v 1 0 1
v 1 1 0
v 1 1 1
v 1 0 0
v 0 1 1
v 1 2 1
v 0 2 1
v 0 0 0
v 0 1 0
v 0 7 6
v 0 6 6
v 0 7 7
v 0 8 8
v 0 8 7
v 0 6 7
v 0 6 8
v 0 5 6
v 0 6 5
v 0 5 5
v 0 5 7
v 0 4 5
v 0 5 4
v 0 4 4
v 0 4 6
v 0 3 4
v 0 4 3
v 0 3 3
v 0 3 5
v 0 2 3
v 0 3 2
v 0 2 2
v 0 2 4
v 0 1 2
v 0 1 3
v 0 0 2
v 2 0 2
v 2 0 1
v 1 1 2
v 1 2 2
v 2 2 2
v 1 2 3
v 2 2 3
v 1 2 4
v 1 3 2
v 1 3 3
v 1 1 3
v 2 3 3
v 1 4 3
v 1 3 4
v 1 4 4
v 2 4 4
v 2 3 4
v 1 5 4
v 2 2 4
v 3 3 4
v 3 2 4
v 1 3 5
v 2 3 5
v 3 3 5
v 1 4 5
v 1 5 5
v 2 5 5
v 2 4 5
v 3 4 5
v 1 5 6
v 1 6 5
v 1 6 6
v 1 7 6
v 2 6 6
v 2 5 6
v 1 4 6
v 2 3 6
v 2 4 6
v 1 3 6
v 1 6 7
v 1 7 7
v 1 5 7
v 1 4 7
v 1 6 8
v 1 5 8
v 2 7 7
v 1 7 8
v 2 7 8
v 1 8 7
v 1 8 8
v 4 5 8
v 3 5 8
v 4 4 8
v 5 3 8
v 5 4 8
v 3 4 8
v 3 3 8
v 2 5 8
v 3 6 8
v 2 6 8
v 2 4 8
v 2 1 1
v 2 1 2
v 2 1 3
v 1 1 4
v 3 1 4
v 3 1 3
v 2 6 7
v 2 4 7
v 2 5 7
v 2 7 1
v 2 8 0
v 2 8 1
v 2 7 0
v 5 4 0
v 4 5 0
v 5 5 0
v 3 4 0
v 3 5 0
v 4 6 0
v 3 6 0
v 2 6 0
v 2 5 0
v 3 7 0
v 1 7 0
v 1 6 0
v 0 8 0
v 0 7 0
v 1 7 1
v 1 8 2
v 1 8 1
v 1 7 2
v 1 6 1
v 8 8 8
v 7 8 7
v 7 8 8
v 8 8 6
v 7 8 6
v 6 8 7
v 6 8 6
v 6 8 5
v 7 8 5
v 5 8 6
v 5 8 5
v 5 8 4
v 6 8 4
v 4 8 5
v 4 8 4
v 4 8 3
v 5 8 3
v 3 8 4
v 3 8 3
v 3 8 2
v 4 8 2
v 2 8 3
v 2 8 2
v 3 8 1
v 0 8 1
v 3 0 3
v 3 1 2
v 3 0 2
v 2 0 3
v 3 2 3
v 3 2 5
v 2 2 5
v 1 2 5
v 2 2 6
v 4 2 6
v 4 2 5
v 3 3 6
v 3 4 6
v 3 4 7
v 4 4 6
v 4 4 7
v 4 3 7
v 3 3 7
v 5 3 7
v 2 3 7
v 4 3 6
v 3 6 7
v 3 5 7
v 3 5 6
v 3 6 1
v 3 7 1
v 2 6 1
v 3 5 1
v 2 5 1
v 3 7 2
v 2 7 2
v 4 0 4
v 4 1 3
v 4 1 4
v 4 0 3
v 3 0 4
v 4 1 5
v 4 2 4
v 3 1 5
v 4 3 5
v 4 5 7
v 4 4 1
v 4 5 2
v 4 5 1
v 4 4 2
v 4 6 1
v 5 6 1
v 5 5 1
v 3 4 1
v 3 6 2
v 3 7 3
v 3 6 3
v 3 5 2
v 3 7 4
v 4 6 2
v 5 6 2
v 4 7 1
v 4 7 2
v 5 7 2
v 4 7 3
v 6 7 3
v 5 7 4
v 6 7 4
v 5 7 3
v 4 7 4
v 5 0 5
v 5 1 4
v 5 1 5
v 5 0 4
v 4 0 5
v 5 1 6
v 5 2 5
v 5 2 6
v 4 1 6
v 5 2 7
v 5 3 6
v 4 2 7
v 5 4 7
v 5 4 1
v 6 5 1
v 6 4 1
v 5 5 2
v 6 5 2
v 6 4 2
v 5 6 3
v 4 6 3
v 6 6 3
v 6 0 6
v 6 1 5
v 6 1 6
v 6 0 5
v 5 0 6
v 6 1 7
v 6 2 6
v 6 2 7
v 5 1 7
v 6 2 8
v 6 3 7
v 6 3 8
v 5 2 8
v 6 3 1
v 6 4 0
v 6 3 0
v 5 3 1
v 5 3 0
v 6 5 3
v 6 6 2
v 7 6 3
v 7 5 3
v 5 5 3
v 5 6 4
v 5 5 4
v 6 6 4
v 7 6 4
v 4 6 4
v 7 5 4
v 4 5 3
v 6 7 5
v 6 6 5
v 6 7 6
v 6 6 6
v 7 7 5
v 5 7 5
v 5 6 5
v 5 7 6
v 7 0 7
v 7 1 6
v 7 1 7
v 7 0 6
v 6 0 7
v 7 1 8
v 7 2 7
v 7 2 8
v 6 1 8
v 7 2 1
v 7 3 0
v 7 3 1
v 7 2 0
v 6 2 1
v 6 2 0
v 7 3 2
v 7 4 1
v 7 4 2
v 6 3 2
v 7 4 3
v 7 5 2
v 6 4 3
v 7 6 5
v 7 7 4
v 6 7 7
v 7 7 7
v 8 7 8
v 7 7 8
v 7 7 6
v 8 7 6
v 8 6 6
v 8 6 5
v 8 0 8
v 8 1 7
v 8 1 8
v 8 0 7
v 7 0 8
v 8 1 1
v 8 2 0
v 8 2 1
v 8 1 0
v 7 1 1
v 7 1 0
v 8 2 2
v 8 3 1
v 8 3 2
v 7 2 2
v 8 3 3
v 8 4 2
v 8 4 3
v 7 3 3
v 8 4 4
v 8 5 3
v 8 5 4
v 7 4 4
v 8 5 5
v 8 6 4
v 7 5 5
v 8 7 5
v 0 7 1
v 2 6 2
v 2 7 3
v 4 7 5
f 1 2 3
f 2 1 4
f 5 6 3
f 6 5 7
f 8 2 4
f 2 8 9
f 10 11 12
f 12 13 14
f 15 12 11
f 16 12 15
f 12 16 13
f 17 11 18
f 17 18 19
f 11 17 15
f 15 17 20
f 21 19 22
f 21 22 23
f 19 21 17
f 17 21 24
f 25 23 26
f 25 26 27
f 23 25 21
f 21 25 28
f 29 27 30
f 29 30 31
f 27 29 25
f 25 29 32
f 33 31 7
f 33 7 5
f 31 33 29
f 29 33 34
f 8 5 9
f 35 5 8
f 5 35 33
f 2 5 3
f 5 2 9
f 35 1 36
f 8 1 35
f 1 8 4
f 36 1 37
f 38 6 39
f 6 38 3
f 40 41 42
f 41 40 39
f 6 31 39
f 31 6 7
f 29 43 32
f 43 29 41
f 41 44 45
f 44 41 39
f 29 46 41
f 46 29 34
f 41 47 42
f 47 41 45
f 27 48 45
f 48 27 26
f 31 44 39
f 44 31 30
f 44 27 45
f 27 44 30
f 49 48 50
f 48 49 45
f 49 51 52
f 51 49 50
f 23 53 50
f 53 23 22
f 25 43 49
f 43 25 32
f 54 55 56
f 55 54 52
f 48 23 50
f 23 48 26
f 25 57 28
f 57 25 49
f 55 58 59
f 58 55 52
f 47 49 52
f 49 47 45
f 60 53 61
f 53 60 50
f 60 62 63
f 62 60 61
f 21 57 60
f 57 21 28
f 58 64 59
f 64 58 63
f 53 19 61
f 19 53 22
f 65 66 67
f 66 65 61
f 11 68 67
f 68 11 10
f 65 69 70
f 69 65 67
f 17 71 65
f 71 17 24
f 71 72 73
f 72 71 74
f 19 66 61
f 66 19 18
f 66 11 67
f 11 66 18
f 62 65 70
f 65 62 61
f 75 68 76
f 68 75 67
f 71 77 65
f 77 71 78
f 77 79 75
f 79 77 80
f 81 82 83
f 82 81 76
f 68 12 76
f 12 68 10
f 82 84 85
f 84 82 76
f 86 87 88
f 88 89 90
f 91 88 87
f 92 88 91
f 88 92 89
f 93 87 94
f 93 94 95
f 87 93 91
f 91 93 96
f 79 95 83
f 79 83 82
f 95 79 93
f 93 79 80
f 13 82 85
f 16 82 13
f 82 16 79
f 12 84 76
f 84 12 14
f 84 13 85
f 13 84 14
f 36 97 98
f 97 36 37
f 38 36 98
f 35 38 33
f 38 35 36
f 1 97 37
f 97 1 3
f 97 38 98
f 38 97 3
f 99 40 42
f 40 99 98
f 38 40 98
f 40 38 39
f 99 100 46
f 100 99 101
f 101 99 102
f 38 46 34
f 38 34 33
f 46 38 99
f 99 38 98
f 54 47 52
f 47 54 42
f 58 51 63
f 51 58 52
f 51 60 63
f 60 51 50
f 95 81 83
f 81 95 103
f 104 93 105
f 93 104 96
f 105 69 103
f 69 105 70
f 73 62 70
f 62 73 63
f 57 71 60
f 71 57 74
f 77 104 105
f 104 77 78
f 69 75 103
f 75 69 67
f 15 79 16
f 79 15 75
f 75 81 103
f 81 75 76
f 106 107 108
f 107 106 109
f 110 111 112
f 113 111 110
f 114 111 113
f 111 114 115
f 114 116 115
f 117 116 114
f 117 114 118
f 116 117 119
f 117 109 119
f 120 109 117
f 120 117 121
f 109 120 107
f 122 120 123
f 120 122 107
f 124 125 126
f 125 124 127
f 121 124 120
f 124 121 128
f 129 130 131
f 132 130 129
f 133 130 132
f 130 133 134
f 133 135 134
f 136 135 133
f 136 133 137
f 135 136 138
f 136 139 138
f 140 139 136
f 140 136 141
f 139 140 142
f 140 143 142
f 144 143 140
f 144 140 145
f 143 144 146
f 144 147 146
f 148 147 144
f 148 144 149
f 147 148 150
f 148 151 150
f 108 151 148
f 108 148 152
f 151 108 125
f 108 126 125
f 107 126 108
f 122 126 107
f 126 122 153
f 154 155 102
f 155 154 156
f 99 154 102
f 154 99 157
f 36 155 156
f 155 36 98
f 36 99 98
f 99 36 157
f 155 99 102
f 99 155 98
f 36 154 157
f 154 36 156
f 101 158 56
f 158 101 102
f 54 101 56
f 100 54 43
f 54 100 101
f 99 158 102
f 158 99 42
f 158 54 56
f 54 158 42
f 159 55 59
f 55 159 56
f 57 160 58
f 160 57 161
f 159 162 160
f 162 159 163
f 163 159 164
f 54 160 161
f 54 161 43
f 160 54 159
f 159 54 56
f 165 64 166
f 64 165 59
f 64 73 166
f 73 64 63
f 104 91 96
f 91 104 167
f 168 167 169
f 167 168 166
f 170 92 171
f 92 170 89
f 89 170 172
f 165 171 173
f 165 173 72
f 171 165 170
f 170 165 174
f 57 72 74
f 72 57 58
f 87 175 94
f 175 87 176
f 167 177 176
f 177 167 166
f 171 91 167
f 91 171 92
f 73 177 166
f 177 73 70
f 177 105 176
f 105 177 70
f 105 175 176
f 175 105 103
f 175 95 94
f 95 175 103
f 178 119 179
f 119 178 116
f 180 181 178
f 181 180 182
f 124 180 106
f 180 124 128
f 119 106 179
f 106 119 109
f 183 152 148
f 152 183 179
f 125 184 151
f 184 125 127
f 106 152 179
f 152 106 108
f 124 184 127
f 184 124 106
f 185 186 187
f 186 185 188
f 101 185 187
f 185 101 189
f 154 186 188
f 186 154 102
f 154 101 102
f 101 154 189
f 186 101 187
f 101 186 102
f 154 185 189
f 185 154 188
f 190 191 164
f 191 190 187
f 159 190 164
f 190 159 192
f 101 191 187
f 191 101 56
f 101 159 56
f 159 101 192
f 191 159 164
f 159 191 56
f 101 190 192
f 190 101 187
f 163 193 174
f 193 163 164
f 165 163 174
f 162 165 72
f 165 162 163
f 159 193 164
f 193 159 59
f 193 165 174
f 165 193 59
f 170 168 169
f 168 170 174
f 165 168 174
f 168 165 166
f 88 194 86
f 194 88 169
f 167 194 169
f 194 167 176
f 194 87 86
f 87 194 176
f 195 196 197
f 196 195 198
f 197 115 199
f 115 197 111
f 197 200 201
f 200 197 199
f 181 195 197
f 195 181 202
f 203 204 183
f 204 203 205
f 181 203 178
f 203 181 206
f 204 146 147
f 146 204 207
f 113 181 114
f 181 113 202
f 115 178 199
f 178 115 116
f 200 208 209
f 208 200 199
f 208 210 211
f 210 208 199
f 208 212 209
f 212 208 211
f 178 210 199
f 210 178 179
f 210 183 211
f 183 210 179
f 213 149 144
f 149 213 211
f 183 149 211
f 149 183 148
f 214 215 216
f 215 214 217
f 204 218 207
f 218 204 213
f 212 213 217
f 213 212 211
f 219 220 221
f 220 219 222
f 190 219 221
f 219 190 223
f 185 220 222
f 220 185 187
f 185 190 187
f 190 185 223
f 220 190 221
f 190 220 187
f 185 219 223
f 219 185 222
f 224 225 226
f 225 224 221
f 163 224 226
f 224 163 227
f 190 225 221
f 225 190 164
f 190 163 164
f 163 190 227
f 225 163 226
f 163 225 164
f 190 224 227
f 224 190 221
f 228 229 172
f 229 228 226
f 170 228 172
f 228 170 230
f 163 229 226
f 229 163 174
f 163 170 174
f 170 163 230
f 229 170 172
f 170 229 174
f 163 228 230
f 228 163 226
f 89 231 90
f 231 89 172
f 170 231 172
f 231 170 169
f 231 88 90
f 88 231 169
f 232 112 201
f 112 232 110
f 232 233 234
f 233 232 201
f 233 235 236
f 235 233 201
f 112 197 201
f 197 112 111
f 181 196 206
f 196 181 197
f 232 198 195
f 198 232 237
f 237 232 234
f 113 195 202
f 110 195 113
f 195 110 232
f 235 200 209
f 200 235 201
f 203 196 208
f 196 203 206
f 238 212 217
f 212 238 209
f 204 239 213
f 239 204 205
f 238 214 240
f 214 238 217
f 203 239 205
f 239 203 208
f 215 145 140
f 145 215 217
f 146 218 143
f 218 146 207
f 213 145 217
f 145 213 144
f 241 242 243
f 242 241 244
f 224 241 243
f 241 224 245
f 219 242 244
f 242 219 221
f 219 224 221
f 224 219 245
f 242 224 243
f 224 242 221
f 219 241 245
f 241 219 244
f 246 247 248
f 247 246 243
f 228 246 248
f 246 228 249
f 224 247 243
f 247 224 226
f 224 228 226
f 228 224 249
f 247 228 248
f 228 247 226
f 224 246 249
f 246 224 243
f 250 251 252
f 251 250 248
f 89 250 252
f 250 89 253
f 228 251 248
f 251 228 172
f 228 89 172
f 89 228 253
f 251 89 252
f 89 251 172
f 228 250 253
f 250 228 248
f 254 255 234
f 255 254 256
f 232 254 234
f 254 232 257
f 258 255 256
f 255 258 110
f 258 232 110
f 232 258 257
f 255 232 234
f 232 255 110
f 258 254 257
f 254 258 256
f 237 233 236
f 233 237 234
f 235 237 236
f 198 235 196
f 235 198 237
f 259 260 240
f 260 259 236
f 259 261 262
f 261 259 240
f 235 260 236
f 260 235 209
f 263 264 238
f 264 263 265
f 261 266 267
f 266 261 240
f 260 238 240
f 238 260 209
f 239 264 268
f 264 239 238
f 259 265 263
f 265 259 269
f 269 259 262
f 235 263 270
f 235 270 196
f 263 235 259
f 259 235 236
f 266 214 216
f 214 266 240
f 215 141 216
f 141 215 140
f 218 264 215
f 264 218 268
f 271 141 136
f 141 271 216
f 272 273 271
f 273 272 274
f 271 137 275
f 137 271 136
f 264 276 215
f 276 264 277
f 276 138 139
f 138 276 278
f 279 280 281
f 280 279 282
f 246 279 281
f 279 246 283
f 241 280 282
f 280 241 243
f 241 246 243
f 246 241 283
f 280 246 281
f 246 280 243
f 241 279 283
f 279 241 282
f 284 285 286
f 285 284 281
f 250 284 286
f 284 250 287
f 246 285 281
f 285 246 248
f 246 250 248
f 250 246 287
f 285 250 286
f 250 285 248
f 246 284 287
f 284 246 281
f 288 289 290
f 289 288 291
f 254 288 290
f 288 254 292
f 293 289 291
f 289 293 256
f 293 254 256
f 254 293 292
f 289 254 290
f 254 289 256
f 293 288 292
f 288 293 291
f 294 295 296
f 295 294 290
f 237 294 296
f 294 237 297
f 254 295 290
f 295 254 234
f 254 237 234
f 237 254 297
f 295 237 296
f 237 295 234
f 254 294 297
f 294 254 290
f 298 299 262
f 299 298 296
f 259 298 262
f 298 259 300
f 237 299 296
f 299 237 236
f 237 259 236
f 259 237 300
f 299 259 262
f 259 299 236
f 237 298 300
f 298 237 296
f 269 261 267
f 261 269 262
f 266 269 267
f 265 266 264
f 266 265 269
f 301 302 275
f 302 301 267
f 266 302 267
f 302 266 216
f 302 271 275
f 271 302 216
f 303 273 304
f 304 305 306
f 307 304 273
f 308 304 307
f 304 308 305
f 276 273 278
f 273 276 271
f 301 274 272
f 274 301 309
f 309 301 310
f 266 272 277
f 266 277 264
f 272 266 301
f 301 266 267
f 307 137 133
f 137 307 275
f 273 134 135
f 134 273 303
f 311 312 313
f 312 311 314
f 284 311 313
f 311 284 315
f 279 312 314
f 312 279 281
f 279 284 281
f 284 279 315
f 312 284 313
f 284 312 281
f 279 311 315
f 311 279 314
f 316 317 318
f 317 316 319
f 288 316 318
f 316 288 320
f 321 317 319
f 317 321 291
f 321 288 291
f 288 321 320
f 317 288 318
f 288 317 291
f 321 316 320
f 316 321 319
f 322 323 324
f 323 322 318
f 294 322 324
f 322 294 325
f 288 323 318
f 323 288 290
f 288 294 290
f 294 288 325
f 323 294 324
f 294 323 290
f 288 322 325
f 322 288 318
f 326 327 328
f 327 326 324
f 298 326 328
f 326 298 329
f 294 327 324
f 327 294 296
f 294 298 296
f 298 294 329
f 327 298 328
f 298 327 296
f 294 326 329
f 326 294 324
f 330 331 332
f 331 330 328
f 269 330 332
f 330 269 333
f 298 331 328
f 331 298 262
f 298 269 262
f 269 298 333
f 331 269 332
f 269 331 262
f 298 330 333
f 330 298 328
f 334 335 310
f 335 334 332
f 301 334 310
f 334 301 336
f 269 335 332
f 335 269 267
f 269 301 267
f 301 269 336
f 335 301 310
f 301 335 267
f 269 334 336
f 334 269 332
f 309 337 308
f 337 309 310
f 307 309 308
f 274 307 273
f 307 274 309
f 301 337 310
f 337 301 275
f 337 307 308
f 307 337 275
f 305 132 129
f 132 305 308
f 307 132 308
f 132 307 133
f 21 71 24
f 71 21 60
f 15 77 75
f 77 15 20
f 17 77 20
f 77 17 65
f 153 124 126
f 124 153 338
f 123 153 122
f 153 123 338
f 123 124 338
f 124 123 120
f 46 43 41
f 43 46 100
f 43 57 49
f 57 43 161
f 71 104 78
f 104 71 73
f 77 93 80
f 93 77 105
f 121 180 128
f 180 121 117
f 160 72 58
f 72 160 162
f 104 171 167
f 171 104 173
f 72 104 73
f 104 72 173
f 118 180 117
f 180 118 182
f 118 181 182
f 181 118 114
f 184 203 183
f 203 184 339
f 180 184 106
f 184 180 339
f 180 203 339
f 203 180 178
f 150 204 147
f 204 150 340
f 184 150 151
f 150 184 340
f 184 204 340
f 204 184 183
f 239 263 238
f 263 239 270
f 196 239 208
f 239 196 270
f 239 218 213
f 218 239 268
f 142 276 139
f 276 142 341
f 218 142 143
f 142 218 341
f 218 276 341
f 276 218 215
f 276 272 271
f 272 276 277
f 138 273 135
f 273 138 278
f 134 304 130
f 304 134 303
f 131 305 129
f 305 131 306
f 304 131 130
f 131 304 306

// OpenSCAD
union() {
    translate([0, 0, 0]) cube([1, 1, 1]);
    translate([0, 1, 1]) cube([1, 1, 1]);
    translate([0, 2, 2]) cube([1, 1, 1]);
    translate([0, 3, 3]) cube([1, 1, 1]);
    translate([0, 4, 4]) cube([1, 1, 1]);
    translate([0, 5, 5]) cube([1, 1, 1]);
    translate([0, 6, 6]) cube([1, 1, 1]);
    translate([0, 7, 7]) cube([1, 1, 1]);
    translate([1, 0, 1]) cube([1, 1, 1]);
    translate([1, 1, 2]) cube([1, 1, 1]);
    translate([1, 2, 3]) cube([1, 1, 1]);
    translate([1, 3, 4]) cube([1, 1, 1]);
    translate([1, 4, 5]) cube([1, 1, 1]);
    translate([1, 5, 6]) cube([1, 1, 1]);
    translate([1, 6, 7]) cube([1, 1, 1]);
    translate([1, 7, 0]) cube([1, 1, 1]);
    translate([2, 0, 2]) cube([1, 1, 1]);
    translate([2, 1, 3]) cube([1, 1, 1]);
    translate([2, 2, 4]) cube([1, 1, 1]);
    translate([2, 3, 5]) cube([1, 1, 1]);
    translate([2, 4, 6]) cube([1, 1, 1]);
    translate([2, 5, 7]) cube([1, 1, 1]);
    translate([2, 6, 0]) cube([1, 1, 1]);
    translate([2, 7, 1]) cube([1, 1, 1]);
    translate([3, 0, 3]) cube([1, 1, 1]);
    translate([3, 1, 4]) cube([1, 1, 1]);
    translate([3, 2, 5]) cube([1, 1, 1]);
    translate([3, 3, 6]) cube([1, 1, 1]);
    translate([3, 4, 7]) cube([1, 1, 1]);
    translate([3, 5, 0]) cube([1, 1, 1]);
    translate([3, 6, 1]) cube([1, 1, 1]);
    translate([3, 7, 2]) cube([1, 1, 1]);
    translate([4, 0, 4]) cube([1, 1, 1]);
    translate([4, 1, 5]) cube([1, 1, 1]);
    translate([4, 2, 6]) cube([1, 1, 1]);
    translate([4, 3, 7]) cube([1, 1, 1]);
    translate([4, 4, 0]) cube([1, 1, 1]);
    translate([4, 5, 1]) cube([1, 1, 1]);
    translate([4, 6, 2]) cube([1, 1, 1]);
    translate([4, 7, 3]) cube([1, 1, 1]);
    translate([5, 0, 5]) cube([1, 1, 1]);
    translate([5, 1, 6]) cube([1, 1, 1]);
    translate([5, 2, 7]) cube([1, 1, 1]);
    translate([5, 3, 0]) cube([1, 1, 1]);
    translate([5, 4, 1]) cube([1, 1, 1]);
    translate([5, 5, 2]) cube([1, 1, 1]);
    translate([5, 6, 3]) cube([1, 1, 1]);
    translate([5, 7, 4]) cube([1, 1, 1]);
    translate([6, 0, 6]) cube([1, 1, 1]);
    translate([6, 1, 7]) cube([1, 1, 1]);
    translate([6, 2, 0]) cube([1, 1, 1]);
    translate([6, 3, 1]) cube([1, 1, 1]);
    translate([6, 4, 2]) cube([1, 1, 1]);
    translate([6, 5, 3]) cube([1, 1, 1]);
    translate([6, 6, 4]) cube([1, 1, 1]);
    translate([6, 7, 5]) cube([1, 1, 1]);
    translate([7, 0, 7]) cube([1, 1, 1]);
    translate([7, 1, 0]) cube([1, 1, 1]);
    translate([7, 2, 1]) cube([1, 1, 1]);
    translate([7, 3, 2]) cube([1, 1, 1]);
    translate([7, 4, 3]) cube([1, 1, 1]);
    translate([7, 5, 4]) cube([1, 1, 1]);
    translate([7, 6, 5]) cube([1, 1, 1]);
    translate([7, 7, 6]) cube([1, 1, 1]);
    translate([0, 0, 1]) cube([1, 1, 1]);
    translate([0, 1, 2]) cube([1, 1, 1]);
    translate([0, 2, 3]) cube([1, 1, 1]);
    translate([0, 3, 4]) cube([1, 1, 1]);
    translate([0, 4, 5]) cube([1, 1, 1]);
    translate([0, 5, 6]) cube([1, 1, 1]);
    translate([0, 6, 7]) cube([1, 1, 1]);
    translate([0, 7, 0]) cube([1, 1, 1]);
    translate([1, 1, 3]) cube([1, 1, 1]);
    translate([1, 2, 4]) cube([1, 1, 1]);
    translate([1, 3, 5]) cube([1, 1, 1]);
    translate([1, 4, 6]) cube([1, 1, 1]);
    translate([1, 5, 7]) cube([1, 1, 1]);
    translate([1, 6, 0]) cube([1, 1, 1]);
    translate([1, 7, 1]) cube([1, 1, 1]);
    translate([2, 2, 5]) cube([1, 1, 1]);
    translate([2, 3, 6]) cube([1, 1, 1]);
    translate([2, 4, 7]) cube([1, 1, 1]);
    translate([2, 5, 0]) cube([1, 1, 1]);
    translate([2, 6, 1]) cube([1, 1, 1]);
    translate([2, 7, 2]) cube([1, 1, 1]);
    translate([3, 3, 7]) cube([1, 1, 1]);
    translate([3, 4, 0]) cube([1, 1, 1]);
    translate([3, 5, 1]) cube([1, 1, 1]);
    translate([3, 6, 2]) cube([1, 1, 1]);
    translate([3, 7, 3]) cube([1, 1, 1]);
    translate([4, 4, 1]) cube([1, 1, 1]);
    translate([4, 5, 2]) cube([1, 1, 1]);
    translate([4, 6, 3]) cube([1, 1, 1]);
    translate([4, 7, 4]) cube([1, 1, 1]);
    translate([5, 5, 3]) cube([1, 1, 1]);
    translate([5, 6, 4]) cube([1, 1, 1]);
    translate([5, 7, 5]) cube([1, 1, 1]);
    translate([6, 6, 5]) cube([1, 1, 1]);
    translate([6, 7, 6]) cube([1, 1, 1]);
    translate([7, 7, 7]) cube([1, 1, 1]);
}
